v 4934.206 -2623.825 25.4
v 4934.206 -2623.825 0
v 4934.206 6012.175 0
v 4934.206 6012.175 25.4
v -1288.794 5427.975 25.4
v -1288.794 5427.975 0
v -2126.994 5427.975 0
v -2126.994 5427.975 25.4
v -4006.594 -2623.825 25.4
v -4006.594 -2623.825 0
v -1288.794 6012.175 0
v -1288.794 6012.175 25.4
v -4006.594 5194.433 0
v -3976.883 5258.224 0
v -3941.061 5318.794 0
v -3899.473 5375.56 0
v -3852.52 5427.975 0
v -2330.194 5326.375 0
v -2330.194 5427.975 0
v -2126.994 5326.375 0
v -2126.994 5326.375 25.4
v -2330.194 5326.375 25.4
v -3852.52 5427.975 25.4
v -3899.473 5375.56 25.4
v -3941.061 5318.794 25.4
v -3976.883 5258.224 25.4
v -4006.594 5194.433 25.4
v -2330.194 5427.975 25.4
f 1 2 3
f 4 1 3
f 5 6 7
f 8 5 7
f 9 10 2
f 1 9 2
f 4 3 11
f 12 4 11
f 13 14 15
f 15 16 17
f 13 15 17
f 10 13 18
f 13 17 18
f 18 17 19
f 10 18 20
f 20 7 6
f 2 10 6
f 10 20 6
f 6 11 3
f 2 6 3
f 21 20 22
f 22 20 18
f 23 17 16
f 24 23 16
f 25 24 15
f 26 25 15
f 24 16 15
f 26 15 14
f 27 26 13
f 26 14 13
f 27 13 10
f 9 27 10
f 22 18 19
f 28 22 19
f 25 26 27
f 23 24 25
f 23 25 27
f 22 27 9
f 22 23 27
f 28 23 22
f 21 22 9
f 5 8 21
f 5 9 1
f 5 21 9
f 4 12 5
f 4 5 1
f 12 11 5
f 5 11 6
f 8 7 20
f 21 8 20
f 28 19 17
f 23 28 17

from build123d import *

# Parameters (mm, degrees)
F0_R     = 685.2304837253
F2_DEPTH = 25.4


# Not quite as in the source:
# - the program builds the solid bodies; features that only make, move or delete a surface that nothing else refers to are left out


with BuildPart() as f2:
    # F0 (on Top) → F2 (new body)
    with BuildSketch(Plane.XY):
        with BuildLine():
            Line((4934.2064314485, -2623.8248911343), (4934.2064314485, 6012.1751088657))
            Line((4934.2064314485, 6012.1751088657), (-1288.7935685515, 6012.1751088657))
            Line((-1288.7935685515, 6012.1751088657), (-1288.7935685515, 5427.9751088657))
            Line((-1288.7935685515, 5427.9751088657), (-2126.9935685515, 5427.9751088657))
            Line((-2126.9935685515, 5427.9751088657), (-2126.9935685515, 5326.3751088657))
            Line((-2126.9935685515, 5326.3751088657), (-2330.1935685515, 5326.3751088657))
            Line((-2330.1935685515, 5326.3751088657), (-2330.1935685515, 5427.9751088657))
            Line((-2330.1935685515, 5427.9751088657), (-2832.8617031592, 5427.9751088657))
            ThreePointArc((-2832.8617031592, 5427.9751088657), (-2679.6080274317, 5196.4381140006), (-2625.8343083567, 4924.033164978))
            ThreePointArc((-2625.8343083567, 4924.033164978), (-3204.9226388633, 4220.5397003228), (-4006.5935685515, 4653.6333043329))
            Line((-4006.5935685515, 4653.6333043329), (-4006.5935685515, -2623.8248911343))
            Line((-4006.5935685515, -2623.8248911343), (547.2349236927, -2623.8248911343))
            ThreePointArc((547.2349236927, -2623.8248911343), (993.2484493325, -1608.5916420747), (1868.1852008655, -2289.8495197296))
            ThreePointArc((1868.1852008655, -2289.8495197296), (1846.7485049438, -2462.0916976859), (1783.7463308849, -2623.8248911343))
            Line((1783.7463308849, -2623.8248911343), (2002.3317513014, -2623.8248911343))
            ThreePointArc((2002.3317513014, -2623.8248911343), (2539.4671679111, -1645.2150017176), (3399.7739963066, -2356.5967082977))
            ThreePointArc((3399.7739963066, -2356.5967082977), (3386.8840068426, -2492.631840649), (3348.6728492235, -2623.8248911343))
            Line((3348.6728492235, -2623.8248911343), (4934.2064314486, -2623.8248911343))
        make_face()
        with Locations((4180.0508499146, 5218.0252075195)):
            Circle(F0_R, mode=Mode.SUBTRACT)
        with BuildLine():
            ThreePointArc((-2625.8343083567, 4924.033164978), (-2679.6080274317, 5196.4381140006), (-2832.8617031592, 5427.9751088657))
            Line((-2832.8617031592, 5427.9751088657), (-3852.5197093468, 5427.9751088657))
            ThreePointArc((-3852.5197093468, 5427.9751088657), (-3941.061075774, 5318.7938470176), (-4006.5935685515, 5194.4330256231))
            Line((-4006.5935685515, 5194.4330256231), (-4006.5935685515, 4653.6333043329))
            ThreePointArc((-4006.5935685515, 4653.6333043329), (-3204.9226388633, 4220.5397003228), (-2625.8343083567, 4924.033164978))
        make_face()
        with Locations((4180.0508499146, 5218.0252075195)):
            Circle(F0_R)
        with BuildLine():
            Line((2002.3317513014, -2623.8248911343), (3348.6728492235, -2623.8248911343))
            ThreePointArc((3348.6728492235, -2623.8248911343), (3386.8840068426, -2492.631840649), (3399.7739963066, -2356.5967082977))
            ThreePointArc((3399.7739963066, -2356.5967082977), (2539.4671679111, -1645.2150017176), (2002.3317513014, -2623.8248911343))
        make_face()
        with BuildLine():
            Line((547.2349236927, -2623.8248911343), (1783.7463308849, -2623.8248911343))
            ThreePointArc((1783.7463308849, -2623.8248911343), (1846.7485049438, -2462.0916976859), (1868.1852008655, -2289.8495197296))
            ThreePointArc((1868.1852008655, -2289.8495197296), (993.2484493325, -1608.5916420747), (547.2349236927, -2623.8248911343))
        make_face()
    extrude(amount=F2_DEPTH)


solid = f2.part
